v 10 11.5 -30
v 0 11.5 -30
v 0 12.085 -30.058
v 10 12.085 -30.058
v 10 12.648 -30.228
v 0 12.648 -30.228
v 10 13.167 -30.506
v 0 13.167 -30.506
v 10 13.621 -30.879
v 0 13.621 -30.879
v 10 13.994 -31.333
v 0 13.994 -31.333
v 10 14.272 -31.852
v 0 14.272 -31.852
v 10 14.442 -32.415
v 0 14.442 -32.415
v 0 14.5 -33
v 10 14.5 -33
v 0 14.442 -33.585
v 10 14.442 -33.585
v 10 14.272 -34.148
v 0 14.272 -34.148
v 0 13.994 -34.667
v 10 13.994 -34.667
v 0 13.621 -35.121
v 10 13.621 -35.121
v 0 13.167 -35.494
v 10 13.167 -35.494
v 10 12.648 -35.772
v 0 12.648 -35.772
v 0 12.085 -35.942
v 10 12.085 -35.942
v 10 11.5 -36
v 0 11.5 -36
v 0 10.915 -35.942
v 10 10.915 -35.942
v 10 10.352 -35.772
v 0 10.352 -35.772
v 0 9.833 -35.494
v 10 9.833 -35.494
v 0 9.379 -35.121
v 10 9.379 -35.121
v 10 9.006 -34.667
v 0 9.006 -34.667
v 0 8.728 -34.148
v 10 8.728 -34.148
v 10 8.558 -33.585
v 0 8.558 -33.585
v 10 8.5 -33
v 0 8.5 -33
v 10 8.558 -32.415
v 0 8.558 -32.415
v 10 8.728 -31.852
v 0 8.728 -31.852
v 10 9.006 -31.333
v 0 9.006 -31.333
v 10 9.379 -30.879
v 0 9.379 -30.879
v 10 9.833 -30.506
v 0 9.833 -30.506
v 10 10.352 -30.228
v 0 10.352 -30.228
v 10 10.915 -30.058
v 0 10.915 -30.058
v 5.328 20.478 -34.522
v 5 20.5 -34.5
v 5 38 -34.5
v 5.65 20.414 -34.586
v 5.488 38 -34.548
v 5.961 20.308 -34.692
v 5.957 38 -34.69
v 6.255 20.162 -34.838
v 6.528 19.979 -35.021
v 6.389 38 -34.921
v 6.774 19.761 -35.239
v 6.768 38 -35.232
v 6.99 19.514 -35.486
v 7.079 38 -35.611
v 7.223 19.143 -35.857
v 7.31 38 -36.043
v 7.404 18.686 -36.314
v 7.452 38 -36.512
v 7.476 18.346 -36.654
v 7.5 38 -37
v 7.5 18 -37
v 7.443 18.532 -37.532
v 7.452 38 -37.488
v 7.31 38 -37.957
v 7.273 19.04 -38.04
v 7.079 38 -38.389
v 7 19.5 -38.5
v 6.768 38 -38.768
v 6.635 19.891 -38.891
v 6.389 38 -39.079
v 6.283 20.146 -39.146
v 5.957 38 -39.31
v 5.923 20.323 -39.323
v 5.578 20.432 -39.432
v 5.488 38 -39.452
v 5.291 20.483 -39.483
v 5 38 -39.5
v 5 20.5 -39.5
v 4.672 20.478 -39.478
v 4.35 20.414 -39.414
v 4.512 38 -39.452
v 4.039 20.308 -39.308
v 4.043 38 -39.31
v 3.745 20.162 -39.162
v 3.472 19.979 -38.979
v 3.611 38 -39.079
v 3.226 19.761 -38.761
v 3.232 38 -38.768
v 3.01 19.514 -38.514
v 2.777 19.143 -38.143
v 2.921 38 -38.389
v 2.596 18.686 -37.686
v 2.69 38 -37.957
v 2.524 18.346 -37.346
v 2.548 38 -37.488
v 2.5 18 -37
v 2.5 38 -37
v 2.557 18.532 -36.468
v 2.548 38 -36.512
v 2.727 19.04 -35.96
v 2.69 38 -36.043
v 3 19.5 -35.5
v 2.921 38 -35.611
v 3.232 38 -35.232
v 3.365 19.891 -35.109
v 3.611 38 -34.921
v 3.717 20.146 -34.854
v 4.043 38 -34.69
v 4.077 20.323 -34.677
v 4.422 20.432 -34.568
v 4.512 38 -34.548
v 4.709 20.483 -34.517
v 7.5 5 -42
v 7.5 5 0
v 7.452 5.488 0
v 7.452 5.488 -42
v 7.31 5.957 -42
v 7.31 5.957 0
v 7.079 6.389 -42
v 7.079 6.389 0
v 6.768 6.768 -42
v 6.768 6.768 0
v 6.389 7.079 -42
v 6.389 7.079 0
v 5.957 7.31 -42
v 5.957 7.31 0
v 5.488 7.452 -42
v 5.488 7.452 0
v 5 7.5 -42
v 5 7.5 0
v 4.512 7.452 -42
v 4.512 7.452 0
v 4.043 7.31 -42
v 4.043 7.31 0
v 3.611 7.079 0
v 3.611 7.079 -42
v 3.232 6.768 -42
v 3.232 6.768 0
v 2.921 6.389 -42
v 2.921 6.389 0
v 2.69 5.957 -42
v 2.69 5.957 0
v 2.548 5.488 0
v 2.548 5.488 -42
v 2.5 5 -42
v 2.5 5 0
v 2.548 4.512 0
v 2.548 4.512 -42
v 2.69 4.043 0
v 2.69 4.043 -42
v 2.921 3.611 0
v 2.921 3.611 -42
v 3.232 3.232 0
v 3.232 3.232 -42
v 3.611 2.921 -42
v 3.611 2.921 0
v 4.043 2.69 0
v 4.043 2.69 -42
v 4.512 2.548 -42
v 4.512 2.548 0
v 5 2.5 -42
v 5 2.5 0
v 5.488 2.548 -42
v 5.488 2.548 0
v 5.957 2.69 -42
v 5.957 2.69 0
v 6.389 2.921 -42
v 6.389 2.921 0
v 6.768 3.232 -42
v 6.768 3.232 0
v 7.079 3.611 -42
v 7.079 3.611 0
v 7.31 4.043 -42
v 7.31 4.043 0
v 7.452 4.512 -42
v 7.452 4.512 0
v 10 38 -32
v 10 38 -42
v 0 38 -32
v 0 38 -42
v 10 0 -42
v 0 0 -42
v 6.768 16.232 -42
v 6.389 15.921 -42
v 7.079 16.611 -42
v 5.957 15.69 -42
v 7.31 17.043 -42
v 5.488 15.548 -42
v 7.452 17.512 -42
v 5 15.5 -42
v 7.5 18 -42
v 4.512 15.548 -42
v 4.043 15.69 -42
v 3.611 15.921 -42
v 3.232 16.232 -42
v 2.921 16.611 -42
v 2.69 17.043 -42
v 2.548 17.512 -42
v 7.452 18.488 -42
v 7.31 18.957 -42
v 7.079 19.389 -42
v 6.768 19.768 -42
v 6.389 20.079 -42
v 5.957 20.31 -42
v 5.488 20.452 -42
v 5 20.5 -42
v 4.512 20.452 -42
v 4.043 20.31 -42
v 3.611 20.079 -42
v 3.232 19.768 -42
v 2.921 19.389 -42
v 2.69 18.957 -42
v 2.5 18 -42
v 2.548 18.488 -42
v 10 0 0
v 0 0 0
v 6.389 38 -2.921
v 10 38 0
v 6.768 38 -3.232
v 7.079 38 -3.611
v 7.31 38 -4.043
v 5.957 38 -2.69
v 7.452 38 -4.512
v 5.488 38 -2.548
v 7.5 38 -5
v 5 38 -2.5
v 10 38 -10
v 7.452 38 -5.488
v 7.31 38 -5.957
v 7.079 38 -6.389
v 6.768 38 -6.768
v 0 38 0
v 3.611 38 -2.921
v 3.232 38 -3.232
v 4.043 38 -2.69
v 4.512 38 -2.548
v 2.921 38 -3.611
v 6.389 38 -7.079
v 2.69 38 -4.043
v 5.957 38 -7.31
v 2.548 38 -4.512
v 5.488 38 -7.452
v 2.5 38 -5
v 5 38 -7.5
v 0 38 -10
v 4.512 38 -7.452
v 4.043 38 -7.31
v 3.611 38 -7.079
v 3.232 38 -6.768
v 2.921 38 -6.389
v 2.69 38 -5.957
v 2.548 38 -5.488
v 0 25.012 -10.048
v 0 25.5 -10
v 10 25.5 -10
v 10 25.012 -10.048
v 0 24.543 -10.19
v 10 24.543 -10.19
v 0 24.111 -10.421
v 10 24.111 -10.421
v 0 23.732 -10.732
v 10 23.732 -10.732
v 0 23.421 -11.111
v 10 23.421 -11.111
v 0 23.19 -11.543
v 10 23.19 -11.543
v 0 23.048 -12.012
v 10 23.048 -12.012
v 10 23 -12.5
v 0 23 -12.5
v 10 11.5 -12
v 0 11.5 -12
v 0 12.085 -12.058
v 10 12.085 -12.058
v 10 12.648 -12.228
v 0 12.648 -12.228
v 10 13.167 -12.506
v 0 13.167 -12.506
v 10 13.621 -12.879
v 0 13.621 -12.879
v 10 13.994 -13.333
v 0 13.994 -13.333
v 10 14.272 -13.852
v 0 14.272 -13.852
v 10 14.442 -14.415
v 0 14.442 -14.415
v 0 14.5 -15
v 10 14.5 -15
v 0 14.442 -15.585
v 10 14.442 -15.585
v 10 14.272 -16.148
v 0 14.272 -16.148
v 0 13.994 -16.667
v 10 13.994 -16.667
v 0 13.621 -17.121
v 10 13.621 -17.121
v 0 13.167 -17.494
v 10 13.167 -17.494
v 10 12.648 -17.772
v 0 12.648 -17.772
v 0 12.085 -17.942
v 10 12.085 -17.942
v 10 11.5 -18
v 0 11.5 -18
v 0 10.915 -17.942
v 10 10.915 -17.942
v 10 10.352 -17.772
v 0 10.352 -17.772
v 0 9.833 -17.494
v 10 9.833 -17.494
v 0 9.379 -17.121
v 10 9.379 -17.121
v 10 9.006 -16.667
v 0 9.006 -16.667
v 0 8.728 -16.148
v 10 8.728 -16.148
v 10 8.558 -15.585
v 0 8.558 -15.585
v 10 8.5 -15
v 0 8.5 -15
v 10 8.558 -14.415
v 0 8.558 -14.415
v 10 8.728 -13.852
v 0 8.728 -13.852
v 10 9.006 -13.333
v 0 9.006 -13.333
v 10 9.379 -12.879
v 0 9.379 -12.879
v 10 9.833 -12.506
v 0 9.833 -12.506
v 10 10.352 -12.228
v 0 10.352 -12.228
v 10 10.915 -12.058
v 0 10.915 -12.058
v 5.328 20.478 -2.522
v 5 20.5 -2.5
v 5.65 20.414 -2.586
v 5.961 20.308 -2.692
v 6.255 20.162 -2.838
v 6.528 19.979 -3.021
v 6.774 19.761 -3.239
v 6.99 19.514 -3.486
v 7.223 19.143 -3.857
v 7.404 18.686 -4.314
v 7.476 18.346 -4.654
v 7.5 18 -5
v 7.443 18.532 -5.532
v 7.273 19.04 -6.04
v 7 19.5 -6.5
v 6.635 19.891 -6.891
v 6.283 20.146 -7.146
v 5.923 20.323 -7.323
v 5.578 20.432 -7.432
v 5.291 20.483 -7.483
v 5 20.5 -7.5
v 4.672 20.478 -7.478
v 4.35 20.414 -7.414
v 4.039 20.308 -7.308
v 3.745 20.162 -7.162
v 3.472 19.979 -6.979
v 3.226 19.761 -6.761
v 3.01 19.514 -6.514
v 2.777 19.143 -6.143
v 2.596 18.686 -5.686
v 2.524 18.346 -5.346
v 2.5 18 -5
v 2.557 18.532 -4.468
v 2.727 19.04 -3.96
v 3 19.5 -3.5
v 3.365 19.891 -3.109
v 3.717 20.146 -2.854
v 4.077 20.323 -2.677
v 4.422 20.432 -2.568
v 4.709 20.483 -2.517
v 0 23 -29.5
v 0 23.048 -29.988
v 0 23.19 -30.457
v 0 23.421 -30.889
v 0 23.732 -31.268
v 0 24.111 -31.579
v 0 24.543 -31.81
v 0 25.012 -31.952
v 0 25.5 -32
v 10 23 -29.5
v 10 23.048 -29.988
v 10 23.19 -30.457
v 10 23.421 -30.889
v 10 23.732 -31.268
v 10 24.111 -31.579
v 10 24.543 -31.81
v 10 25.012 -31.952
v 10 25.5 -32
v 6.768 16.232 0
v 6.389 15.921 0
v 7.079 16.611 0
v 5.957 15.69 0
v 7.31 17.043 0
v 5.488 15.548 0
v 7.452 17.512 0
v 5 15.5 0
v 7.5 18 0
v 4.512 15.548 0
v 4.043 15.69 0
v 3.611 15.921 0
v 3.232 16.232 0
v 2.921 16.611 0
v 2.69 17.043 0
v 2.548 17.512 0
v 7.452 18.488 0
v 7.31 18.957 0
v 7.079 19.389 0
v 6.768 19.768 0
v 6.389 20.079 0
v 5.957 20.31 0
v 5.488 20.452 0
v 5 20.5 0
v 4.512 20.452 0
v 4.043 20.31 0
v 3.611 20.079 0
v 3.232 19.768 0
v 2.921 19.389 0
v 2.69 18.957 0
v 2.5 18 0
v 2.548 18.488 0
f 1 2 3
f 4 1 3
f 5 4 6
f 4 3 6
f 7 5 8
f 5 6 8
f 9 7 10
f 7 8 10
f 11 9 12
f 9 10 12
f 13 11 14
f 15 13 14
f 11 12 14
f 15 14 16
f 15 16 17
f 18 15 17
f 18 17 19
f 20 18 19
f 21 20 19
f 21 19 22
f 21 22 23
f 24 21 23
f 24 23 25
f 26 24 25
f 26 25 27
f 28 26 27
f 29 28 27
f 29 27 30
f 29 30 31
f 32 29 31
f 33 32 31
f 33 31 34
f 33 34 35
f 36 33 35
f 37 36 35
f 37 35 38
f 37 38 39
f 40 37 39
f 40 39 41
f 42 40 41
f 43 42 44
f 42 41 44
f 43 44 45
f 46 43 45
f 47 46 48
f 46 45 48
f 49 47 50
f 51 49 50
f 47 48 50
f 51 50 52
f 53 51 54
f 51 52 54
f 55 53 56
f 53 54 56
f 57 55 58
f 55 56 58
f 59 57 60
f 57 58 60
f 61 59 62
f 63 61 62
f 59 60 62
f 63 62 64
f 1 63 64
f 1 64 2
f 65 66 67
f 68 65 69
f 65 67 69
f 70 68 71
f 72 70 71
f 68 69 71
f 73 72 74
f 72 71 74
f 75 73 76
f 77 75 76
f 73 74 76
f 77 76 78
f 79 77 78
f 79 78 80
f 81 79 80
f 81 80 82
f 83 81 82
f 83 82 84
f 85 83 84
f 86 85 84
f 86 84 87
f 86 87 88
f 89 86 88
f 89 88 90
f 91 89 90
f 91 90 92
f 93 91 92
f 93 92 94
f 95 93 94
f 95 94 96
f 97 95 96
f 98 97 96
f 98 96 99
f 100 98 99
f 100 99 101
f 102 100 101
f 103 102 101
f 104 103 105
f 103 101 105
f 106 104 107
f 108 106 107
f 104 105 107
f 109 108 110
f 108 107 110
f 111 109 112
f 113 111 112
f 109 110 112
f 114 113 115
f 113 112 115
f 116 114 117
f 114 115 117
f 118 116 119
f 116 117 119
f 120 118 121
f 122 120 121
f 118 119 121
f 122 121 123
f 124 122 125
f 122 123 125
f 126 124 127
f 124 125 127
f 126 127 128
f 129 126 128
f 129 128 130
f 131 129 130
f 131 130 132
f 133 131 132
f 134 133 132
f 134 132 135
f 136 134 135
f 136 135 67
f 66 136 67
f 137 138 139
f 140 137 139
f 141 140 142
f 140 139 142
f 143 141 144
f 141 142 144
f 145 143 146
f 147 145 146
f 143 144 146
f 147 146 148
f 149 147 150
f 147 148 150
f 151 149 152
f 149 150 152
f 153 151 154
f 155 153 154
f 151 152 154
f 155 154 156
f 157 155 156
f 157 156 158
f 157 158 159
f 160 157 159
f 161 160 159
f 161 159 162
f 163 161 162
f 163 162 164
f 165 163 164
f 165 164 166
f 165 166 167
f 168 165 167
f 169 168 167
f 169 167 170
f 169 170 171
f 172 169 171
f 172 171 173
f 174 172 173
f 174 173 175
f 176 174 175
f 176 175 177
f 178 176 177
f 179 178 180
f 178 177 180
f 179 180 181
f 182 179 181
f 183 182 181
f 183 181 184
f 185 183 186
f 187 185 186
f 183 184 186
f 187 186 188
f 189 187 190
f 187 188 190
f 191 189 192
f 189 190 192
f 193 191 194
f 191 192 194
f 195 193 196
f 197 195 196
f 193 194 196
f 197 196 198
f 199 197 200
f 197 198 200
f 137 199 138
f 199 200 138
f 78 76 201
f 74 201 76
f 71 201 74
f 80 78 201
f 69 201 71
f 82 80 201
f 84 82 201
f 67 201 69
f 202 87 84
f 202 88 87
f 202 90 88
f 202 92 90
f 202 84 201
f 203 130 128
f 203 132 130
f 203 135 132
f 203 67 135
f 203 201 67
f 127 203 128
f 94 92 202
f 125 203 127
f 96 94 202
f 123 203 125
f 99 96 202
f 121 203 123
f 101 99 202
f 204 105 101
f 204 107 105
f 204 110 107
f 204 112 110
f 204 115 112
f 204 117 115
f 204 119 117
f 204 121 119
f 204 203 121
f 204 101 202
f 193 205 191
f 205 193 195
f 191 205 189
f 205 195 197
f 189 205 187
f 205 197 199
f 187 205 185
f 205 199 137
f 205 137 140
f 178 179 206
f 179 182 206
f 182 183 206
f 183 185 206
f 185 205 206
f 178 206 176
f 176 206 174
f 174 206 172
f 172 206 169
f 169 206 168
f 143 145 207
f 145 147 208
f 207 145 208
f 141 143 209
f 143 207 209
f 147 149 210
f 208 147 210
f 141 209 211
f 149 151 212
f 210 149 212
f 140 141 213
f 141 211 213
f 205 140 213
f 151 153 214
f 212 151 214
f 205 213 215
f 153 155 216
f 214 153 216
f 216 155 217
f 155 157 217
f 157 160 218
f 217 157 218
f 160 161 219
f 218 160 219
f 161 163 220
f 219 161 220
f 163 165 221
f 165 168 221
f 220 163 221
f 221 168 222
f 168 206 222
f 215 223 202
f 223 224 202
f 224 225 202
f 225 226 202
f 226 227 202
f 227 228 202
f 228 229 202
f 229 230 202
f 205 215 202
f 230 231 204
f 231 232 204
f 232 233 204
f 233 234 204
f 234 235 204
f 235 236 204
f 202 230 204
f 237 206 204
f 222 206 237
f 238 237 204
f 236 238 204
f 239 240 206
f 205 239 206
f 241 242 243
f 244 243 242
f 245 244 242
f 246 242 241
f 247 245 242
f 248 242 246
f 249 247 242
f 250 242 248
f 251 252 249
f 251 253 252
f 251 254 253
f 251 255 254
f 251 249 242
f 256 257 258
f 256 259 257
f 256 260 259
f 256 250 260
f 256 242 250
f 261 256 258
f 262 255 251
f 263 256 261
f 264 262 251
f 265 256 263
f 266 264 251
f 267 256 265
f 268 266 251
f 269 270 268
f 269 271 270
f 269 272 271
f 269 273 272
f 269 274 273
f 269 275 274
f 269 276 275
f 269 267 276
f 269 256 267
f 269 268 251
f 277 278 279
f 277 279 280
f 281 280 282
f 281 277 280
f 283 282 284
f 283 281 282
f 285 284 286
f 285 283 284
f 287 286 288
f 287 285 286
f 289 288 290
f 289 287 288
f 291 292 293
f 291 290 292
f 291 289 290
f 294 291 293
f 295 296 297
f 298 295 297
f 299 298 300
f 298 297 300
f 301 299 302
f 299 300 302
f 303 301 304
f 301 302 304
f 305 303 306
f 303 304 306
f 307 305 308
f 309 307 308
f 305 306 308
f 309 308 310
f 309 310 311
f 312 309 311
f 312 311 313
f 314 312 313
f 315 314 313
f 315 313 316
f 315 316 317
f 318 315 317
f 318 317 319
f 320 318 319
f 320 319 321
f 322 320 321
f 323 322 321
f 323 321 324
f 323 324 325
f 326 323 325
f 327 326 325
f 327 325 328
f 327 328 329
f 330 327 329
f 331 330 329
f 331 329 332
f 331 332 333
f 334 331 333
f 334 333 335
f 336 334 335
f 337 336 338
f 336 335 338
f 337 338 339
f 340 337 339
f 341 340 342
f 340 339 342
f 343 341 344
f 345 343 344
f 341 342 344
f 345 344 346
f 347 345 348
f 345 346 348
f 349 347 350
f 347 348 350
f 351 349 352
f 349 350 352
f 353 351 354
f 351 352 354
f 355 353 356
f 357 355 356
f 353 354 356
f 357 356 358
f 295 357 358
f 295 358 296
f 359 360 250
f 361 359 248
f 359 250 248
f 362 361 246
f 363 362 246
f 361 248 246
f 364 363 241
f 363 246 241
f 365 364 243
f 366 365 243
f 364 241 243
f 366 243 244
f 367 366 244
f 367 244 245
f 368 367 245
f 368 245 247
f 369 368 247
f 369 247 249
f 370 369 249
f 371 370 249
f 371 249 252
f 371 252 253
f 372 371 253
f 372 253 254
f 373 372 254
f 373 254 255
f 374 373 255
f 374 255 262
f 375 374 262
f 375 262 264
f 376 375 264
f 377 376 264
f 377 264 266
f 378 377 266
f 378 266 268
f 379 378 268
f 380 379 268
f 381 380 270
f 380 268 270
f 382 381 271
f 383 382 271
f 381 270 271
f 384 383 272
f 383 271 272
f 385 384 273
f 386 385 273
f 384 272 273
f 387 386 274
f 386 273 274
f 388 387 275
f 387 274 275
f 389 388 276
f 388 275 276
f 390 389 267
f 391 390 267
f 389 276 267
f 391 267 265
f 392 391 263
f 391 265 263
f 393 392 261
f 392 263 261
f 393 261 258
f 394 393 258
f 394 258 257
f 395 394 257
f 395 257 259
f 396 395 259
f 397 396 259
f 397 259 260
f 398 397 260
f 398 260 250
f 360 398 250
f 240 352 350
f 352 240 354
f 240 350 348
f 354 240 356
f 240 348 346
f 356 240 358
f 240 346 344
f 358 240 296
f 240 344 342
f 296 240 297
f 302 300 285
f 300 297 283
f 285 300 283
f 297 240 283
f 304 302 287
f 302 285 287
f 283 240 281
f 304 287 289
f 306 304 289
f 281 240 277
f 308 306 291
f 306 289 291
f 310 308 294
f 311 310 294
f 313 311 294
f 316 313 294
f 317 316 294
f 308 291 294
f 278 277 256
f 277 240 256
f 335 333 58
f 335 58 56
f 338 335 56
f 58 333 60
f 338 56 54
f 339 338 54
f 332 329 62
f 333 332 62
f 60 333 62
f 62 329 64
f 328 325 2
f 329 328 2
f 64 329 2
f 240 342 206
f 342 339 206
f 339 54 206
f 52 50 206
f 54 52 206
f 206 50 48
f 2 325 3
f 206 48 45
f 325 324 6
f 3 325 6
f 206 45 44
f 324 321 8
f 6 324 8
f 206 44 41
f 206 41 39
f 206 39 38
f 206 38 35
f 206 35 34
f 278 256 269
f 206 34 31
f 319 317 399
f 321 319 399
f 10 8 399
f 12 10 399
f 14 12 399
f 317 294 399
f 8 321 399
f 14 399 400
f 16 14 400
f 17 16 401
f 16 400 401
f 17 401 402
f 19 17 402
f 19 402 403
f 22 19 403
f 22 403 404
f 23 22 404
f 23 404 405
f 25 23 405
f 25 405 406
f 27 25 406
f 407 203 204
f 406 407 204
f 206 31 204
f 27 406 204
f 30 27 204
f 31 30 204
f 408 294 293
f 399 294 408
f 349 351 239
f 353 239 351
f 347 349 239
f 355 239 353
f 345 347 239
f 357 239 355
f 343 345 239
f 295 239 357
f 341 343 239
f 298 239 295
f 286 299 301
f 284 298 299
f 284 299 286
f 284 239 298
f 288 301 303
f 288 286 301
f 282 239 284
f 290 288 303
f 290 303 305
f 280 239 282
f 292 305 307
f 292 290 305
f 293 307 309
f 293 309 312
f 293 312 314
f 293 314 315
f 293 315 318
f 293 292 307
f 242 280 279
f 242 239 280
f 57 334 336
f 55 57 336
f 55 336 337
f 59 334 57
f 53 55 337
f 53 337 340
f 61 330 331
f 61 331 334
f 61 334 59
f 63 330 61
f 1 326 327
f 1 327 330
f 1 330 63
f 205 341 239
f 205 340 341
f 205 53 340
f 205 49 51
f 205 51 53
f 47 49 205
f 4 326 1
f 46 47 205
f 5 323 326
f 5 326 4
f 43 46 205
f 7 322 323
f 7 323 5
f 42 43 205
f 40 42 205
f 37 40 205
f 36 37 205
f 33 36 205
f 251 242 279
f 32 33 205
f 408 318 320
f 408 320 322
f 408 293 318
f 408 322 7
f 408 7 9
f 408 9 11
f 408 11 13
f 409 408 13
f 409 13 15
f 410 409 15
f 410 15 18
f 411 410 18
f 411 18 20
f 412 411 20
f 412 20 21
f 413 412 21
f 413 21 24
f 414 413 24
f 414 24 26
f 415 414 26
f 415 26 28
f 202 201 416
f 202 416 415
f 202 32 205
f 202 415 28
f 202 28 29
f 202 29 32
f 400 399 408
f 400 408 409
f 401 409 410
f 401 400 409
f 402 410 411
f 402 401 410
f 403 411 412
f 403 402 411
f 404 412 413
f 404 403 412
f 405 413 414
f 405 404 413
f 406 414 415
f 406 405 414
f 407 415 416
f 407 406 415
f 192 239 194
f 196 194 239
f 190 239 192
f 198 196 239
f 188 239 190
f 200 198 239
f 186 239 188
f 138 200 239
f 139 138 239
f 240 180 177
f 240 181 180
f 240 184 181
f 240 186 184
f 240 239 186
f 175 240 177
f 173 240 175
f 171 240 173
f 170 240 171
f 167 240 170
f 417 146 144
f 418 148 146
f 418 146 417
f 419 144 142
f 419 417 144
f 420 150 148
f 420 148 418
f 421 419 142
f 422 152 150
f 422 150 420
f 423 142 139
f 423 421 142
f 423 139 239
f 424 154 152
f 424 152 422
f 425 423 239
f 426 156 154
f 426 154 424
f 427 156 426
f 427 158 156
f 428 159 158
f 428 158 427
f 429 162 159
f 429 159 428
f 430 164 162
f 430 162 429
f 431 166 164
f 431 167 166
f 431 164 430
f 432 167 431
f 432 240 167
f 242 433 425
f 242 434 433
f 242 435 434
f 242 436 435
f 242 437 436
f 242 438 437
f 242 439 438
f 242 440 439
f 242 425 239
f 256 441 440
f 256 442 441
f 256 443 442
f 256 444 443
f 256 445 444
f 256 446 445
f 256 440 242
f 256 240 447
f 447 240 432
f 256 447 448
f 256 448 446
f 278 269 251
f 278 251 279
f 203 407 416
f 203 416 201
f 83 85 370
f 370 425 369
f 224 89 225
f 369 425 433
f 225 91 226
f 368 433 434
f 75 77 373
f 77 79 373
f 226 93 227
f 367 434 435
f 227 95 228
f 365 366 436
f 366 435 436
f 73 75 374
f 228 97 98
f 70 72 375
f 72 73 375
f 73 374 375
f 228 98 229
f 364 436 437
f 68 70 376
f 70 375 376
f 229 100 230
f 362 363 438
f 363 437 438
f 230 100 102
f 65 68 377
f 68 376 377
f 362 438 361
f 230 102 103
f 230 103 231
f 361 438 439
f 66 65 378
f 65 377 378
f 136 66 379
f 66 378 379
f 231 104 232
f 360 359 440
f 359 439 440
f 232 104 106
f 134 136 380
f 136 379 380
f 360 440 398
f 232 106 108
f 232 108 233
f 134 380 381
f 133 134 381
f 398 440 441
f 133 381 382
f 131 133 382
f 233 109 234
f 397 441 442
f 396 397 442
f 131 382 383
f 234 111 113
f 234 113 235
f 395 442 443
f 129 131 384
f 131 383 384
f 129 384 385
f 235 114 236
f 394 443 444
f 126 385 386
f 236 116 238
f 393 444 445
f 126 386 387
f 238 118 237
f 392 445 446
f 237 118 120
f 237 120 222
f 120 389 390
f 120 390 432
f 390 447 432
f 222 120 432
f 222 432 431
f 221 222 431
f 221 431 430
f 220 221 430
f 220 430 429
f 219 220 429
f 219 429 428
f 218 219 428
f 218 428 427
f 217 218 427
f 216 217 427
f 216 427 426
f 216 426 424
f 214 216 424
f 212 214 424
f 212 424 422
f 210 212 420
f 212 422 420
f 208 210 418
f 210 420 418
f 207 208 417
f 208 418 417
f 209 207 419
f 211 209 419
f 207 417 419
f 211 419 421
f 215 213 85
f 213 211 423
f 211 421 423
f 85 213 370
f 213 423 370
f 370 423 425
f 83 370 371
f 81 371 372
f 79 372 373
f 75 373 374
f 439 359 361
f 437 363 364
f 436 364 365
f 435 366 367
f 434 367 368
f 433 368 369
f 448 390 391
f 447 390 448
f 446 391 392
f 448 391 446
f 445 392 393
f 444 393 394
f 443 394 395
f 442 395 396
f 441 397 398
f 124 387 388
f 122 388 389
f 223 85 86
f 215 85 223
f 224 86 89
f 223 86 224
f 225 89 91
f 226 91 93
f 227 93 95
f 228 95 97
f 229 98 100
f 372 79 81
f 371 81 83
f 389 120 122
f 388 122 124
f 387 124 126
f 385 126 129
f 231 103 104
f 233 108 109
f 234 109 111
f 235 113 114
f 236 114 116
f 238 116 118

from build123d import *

# Parameters (mm, degrees)
ESQUISSE1_W           = 42
ESQUISSE1_H           = 38
EXTRUSION1_DEPTH      = 10
ESQUISSE2_R           = 2.5
EXTRUSION3_DEPTH      = 58.515215378
EXTRUSION4_REACH      = 59.515
EXTRUSION4_END_RADIUS = 2.5
ESQUISSE4_R           = 2.5
EXTRUSION5_DEPTH      = 58.515215378
ESQUISSE6_R           = 3
EXTRUSION6_DEPTH      = 58.515215378


with BuildPart() as part:
    # Esquisse1 → Extrusion1 (new body)
    with BuildSketch(Plane(origin=(0, 0, 0), x_dir=(0, 0, -1), z_dir=(1, 0, 0))):
        with Locations((21, 19)):
            Rectangle(ESQUISSE1_W, ESQUISSE1_H)
    extrude(amount=EXTRUSION1_DEPTH)

    # Esquisse2 → Extrusion3 (cut, through all)
    with BuildSketch(Plane.XY):
        with Locations((5, 5)):
            Circle(ESQUISSE2_R)
        with Locations((5, 18)):
            Circle(ESQUISSE2_R)
    extrude(amount=-EXTRUSION3_DEPTH, mode=Mode.SUBTRACT)

    # Extrusion4: up to this cylinder (the profile starts outside it)
    extrusion4_end = Plane(origin=(5, 18, -21), z_dir=(0, 0, 1)) * Cylinder(EXTRUSION4_END_RADIUS, 157.03, mode=Mode.PRIVATE)
    # Esquisse4 → Extrusion4 (cut, up to the surface)
    with BuildSketch(Plane(origin=(0, 38, 0), x_dir=(1, 0, 0), z_dir=(0, 1, 0)), mode=Mode.PRIVATE) as extrusion4_sk1:
        with Locations(Location((5, 5, 0), (0, 0, 270))):
            Circle(ESQUISSE4_R)
    extrusion4_tool1 = extrude(extrusion4_sk1.sketch, amount=-EXTRUSION4_REACH, mode=Mode.PRIVATE) - extrusion4_end
    add(extrusion4_tool1.solids().sort_by_distance((5, 38, -5))[0], mode=Mode.SUBTRACT)
    # Esquisse4 → Extrusion4 (cut, up to the surface)
    with BuildSketch(Plane(origin=(0, 38, 0), x_dir=(1, 0, 0), z_dir=(0, 1, 0)), mode=Mode.PRIVATE) as extrusion4_sk2:
        with Locations(Location((5, 37, 0), (0, 0, 270))):
            Circle(ESQUISSE4_R)
    extrusion4_tool2 = extrude(extrusion4_sk2.sketch, amount=-EXTRUSION4_REACH, mode=Mode.PRIVATE) - extrusion4_end
    add(extrusion4_tool2.solids().sort_by_distance((5, 38, -37))[0], mode=Mode.SUBTRACT)

    # Esquisse5 → Extrusion5 (cut, through all)
    with BuildSketch(Plane.ZY):
        with BuildLine():
            Line((-32, 40.062963014), (-10, 40.062963014))
            Line((-10, 40.062963014), (-10, 25.5))
            ThreePointArc((-10, 25.5), (-10.732233047, 23.732233047), (-12.5, 23))
            Line((-12.5, 23), (-29.5, 23))
            ThreePointArc((-29.5, 23), (-31.267766953, 23.732233047), (-32, 25.5))
            Line((-32, 25.5), (-32, 40.062963014))
        make_face()
    extrude(amount=-EXTRUSION5_DEPTH, mode=Mode.SUBTRACT)

    # Esquisse6 → Extrusion6 (cut, through all)
    with BuildSketch(Plane.ZY):
        with Locations((-33, 11.5)):
            Circle(ESQUISSE6_R)
        with Locations((-15, 11.5)):
            Circle(ESQUISSE6_R)
    extrude(amount=-EXTRUSION6_DEPTH, mode=Mode.SUBTRACT)


solid = part.part
